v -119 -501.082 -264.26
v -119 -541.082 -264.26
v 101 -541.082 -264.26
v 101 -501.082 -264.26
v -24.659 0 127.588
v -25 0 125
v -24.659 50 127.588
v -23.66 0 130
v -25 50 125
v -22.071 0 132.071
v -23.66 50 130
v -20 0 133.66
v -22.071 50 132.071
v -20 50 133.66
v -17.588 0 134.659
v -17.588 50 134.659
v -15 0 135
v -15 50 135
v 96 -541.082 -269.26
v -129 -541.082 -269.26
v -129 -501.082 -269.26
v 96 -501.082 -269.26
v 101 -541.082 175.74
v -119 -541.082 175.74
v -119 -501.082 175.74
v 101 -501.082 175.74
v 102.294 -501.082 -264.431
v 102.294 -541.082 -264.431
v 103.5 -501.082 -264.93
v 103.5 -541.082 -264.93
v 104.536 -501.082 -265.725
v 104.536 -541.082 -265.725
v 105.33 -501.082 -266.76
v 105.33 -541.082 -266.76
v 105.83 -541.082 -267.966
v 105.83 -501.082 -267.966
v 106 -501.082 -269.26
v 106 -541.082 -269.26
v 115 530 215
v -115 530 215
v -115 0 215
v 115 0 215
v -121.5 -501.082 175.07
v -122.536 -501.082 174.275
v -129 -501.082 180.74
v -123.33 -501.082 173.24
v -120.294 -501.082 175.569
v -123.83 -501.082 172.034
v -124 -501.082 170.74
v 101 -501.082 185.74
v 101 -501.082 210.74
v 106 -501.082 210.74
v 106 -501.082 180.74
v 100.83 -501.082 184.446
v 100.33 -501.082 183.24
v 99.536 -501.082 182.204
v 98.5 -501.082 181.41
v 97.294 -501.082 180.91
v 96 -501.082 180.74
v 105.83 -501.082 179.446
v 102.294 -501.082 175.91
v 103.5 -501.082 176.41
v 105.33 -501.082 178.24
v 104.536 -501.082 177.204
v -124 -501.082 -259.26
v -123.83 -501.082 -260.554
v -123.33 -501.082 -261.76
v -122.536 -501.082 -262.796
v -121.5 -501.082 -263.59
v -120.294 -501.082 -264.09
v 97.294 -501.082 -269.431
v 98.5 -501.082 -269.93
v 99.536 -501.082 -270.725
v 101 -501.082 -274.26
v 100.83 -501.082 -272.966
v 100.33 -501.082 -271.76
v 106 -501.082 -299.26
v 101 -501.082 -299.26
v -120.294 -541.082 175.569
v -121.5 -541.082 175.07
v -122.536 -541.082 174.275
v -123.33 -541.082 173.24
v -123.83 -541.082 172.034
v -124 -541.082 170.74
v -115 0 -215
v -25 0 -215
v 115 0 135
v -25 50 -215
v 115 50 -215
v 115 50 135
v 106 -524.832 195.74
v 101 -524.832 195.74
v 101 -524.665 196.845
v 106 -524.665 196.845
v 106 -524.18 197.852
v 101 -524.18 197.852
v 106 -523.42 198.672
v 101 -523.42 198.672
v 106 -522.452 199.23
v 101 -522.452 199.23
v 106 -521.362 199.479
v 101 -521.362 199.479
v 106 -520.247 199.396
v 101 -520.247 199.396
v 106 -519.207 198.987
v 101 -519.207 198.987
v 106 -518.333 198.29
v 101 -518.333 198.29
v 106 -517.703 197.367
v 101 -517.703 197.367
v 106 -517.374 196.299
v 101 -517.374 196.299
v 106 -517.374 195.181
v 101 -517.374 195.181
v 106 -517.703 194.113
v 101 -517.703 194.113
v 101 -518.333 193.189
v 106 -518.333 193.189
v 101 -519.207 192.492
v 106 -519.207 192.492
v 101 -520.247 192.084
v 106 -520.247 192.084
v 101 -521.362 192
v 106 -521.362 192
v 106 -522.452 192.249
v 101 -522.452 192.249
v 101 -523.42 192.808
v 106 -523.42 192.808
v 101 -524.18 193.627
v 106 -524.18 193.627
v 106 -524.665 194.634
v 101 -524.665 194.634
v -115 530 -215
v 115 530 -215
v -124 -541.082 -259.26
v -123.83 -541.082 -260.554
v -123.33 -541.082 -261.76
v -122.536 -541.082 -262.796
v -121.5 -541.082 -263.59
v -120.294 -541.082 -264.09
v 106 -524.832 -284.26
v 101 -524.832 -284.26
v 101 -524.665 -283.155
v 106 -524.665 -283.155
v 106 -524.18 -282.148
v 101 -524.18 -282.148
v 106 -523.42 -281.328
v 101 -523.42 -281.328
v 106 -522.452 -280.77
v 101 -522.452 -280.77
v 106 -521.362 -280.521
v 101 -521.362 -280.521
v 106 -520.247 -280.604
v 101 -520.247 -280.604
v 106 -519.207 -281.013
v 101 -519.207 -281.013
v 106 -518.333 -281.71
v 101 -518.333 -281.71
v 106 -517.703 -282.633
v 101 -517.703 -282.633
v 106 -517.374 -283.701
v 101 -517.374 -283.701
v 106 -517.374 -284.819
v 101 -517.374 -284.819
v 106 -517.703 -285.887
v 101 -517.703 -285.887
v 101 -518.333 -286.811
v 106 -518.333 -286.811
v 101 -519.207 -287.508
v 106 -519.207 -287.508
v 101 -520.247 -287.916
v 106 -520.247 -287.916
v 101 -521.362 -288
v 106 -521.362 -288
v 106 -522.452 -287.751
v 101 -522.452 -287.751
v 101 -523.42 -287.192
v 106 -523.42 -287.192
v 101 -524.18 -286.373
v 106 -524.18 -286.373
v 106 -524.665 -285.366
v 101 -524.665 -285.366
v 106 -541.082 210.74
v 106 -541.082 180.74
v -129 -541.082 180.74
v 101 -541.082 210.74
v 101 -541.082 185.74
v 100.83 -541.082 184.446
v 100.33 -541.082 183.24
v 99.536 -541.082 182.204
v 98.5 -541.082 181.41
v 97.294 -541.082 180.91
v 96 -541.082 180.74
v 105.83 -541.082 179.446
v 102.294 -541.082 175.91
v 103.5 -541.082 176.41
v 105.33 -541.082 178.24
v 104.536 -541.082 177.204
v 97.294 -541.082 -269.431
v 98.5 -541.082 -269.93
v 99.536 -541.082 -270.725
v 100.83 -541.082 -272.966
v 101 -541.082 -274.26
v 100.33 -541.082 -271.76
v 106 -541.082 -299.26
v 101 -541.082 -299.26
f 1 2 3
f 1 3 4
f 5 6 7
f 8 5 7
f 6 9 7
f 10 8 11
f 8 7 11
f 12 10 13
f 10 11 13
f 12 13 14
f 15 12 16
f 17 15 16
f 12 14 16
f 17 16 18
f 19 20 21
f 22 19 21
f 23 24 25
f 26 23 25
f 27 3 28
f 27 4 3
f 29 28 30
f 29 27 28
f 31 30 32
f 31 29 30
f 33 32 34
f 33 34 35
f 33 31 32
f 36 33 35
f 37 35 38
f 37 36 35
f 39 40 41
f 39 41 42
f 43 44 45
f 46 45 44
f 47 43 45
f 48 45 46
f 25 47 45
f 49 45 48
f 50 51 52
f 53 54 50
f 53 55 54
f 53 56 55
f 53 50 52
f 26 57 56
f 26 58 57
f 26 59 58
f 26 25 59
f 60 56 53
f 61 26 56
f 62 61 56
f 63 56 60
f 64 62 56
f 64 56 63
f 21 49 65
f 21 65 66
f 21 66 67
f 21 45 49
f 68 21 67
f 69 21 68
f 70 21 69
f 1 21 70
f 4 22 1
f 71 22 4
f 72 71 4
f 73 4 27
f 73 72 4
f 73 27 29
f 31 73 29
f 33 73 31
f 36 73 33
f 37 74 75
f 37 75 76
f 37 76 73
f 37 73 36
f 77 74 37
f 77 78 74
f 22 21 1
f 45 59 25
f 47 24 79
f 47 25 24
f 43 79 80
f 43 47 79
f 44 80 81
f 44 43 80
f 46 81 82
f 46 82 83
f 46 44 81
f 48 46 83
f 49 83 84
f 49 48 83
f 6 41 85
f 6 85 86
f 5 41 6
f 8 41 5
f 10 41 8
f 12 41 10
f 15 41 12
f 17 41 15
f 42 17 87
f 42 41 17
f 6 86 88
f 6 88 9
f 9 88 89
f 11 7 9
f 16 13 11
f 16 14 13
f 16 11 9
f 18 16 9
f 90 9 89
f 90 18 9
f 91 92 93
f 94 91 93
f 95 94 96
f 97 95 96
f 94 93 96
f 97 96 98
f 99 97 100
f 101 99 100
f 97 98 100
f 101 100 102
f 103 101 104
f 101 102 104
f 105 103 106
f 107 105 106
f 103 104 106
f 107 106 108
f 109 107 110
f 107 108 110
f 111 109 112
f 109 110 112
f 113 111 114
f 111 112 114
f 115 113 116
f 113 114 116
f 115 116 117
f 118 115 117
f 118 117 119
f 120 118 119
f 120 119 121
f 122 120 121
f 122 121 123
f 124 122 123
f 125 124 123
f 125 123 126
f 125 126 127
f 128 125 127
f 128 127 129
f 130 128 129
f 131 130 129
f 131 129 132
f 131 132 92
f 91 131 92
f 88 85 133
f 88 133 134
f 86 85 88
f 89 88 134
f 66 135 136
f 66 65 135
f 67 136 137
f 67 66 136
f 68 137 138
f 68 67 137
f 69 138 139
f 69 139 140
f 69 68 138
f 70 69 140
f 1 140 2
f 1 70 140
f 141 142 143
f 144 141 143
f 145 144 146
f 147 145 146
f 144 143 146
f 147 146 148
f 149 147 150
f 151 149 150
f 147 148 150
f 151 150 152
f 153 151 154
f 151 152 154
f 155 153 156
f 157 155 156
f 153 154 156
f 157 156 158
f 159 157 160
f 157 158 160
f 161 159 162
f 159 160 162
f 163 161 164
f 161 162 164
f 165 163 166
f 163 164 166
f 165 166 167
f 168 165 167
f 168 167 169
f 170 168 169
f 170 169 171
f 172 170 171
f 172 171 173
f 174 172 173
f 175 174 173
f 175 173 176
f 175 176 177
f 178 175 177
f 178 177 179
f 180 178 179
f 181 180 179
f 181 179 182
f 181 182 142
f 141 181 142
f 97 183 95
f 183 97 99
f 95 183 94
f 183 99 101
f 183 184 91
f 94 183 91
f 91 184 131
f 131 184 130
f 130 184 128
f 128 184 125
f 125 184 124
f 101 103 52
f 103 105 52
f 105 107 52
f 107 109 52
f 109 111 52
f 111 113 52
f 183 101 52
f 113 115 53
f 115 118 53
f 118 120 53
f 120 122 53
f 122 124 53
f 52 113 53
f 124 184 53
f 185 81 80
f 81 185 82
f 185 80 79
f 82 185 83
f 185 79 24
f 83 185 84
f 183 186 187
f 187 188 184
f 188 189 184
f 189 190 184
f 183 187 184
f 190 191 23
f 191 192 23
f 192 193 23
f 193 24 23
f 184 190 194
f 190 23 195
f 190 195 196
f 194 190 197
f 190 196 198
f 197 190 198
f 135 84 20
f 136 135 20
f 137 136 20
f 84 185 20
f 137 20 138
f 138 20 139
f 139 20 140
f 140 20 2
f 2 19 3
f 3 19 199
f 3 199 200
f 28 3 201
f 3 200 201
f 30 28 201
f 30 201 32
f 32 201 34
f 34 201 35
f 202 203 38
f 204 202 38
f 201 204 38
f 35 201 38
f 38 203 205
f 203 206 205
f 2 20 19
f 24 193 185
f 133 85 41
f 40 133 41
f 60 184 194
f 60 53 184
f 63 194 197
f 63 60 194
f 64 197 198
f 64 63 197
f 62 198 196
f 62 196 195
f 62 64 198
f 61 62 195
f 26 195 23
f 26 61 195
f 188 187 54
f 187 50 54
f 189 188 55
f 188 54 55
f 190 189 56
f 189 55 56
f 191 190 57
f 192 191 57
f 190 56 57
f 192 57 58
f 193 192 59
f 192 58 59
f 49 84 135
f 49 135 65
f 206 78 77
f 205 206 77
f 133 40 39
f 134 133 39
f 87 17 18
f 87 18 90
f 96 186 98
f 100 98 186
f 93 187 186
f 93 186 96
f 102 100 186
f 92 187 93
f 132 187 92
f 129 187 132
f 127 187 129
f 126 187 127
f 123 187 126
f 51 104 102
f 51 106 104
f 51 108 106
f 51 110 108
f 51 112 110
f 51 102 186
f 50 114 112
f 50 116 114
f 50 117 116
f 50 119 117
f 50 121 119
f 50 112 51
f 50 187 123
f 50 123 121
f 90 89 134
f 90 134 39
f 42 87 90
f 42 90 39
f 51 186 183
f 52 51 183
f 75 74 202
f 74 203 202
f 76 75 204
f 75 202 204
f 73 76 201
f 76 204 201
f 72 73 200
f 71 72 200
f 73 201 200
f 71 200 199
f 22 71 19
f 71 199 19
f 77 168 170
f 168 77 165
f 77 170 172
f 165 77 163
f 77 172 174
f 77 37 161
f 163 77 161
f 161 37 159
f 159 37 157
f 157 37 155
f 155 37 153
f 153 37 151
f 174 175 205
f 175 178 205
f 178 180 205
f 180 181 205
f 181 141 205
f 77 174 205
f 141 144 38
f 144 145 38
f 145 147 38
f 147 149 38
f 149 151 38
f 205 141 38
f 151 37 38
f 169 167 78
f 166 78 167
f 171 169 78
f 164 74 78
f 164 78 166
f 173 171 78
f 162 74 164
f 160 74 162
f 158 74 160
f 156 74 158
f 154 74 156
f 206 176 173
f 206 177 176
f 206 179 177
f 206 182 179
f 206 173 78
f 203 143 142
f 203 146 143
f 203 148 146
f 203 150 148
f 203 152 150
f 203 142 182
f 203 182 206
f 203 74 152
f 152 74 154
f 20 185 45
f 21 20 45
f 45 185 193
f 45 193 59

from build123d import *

# Parameters (mm, degrees)
F0_W      = 230
F0_H      = 430
F2_DEPTH  = 530
F1_W      = 140
F1_H      = 350
F3_DEPTH  = 50
F4_R      = 10
F5_W      = 40
F5_H      = 450
F6_DEPTH  = 5
F8_W      = 40
F8_H      = 5
F9_DEPTH  = 230
F10_W     = 5
F10_H     = 40
F12_DEPTH = 30
F11_W     = 5
F11_H     = 40
F13_DEPTH = 30
F14_R     = 5
F15_R     = 3.75
F17_DEPTH = 25
F16_R     = 3.75
F18_DEPTH = 25


with BuildPart() as f2:
    # F0 (on Front) → F2 (new body)
    with BuildSketch(Plane.XZ):
        Rectangle(F0_W, F0_H)
    extrude(amount=-F2_DEPTH)

    # F1 (on face) → F3 (cut)
    with BuildSketch(Plane.XZ):
        with Locations((45, -40)):
            Rectangle(F1_W, F1_H)
    extrude(amount=-F3_DEPTH, mode=Mode.SUBTRACT)

    # F4
    f4_edges = [f2.edges().sort_by_distance(p)[0] for p in [
        (-25, 25, 135),
    ]]
    fillet(f4_edges, radius=F4_R)


with BuildPart() as f6:
    # F5 (on Right) → F6 (new body)
    with BuildSketch(Plane.YZ):
        with Locations((-72.081908, 3.739637)):
            Rectangle(F5_W, F5_H)
    extrude(amount=F6_DEPTH)


with BuildPart() as f6_1:
    # F7: moved
    add(f6.part.moved(Location((-129, -449, -48))))

    # F8 (on face) → F9 (join)
    with BuildSketch(Plane.YZ.offset(-124)):
        with Locations((-521.081908, -266.760363)):
            Rectangle(F8_W, F8_H)
        with Locations((-521.081908, 178.239637)):
            Rectangle(F8_W, F8_H)
    extrude(amount=F9_DEPTH)

    # F10 (on face) → F12 (join)
    with BuildSketch(Plane(origin=(0, 0, -269.260363), x_dir=(1, 0, 0), z_dir=(0, 0, -1))):
        with Locations((103.5, 521.081908)):
            Rectangle(F10_W, F10_H)
    extrude(amount=F12_DEPTH)

    # F11 (on face) → F13 (join)
    with BuildSketch(Plane.XY.offset(180.739637)):
        with Locations((103.5, -521.081908)):
            Rectangle(F11_W, F11_H)
    extrude(amount=F13_DEPTH)

    # F14
    f14_edges = [f6_1.edges().sort_by_distance(p)[0] for p in [
        (-124, -521.081908, -264.260363),
        (101, -521.081908, -269.260363),
        (-124, -521.081908, 175.739637),
        (101, -521.081908, 180.739637),
        (106, -521.081908, -264.260363),
        (106, -521.081908, 175.739637),
    ]]
    fillet(f14_edges, radius=F14_R)

    # F15 (on face) → F17 (cut)
    with BuildSketch(Plane(origin=(101, 0, 0), x_dir=(0, -1, 0), z_dir=(-1, 0, 0))):
        with Locations((521.081908, -284.260363)):
            Circle(F15_R)
    extrude(amount=-F17_DEPTH, mode=Mode.SUBTRACT)

    # F16 (on face) → F18 (cut)
    with BuildSketch(Plane(origin=(101, 0, 0), x_dir=(0, -1, 0), z_dir=(-1, 0, 0))):
        with Locations((521.081908, 195.739637)):
            Circle(F16_R)
    extrude(amount=-F18_DEPTH, mode=Mode.SUBTRACT)


solid = Compound([f2.part, f6_1.part])
